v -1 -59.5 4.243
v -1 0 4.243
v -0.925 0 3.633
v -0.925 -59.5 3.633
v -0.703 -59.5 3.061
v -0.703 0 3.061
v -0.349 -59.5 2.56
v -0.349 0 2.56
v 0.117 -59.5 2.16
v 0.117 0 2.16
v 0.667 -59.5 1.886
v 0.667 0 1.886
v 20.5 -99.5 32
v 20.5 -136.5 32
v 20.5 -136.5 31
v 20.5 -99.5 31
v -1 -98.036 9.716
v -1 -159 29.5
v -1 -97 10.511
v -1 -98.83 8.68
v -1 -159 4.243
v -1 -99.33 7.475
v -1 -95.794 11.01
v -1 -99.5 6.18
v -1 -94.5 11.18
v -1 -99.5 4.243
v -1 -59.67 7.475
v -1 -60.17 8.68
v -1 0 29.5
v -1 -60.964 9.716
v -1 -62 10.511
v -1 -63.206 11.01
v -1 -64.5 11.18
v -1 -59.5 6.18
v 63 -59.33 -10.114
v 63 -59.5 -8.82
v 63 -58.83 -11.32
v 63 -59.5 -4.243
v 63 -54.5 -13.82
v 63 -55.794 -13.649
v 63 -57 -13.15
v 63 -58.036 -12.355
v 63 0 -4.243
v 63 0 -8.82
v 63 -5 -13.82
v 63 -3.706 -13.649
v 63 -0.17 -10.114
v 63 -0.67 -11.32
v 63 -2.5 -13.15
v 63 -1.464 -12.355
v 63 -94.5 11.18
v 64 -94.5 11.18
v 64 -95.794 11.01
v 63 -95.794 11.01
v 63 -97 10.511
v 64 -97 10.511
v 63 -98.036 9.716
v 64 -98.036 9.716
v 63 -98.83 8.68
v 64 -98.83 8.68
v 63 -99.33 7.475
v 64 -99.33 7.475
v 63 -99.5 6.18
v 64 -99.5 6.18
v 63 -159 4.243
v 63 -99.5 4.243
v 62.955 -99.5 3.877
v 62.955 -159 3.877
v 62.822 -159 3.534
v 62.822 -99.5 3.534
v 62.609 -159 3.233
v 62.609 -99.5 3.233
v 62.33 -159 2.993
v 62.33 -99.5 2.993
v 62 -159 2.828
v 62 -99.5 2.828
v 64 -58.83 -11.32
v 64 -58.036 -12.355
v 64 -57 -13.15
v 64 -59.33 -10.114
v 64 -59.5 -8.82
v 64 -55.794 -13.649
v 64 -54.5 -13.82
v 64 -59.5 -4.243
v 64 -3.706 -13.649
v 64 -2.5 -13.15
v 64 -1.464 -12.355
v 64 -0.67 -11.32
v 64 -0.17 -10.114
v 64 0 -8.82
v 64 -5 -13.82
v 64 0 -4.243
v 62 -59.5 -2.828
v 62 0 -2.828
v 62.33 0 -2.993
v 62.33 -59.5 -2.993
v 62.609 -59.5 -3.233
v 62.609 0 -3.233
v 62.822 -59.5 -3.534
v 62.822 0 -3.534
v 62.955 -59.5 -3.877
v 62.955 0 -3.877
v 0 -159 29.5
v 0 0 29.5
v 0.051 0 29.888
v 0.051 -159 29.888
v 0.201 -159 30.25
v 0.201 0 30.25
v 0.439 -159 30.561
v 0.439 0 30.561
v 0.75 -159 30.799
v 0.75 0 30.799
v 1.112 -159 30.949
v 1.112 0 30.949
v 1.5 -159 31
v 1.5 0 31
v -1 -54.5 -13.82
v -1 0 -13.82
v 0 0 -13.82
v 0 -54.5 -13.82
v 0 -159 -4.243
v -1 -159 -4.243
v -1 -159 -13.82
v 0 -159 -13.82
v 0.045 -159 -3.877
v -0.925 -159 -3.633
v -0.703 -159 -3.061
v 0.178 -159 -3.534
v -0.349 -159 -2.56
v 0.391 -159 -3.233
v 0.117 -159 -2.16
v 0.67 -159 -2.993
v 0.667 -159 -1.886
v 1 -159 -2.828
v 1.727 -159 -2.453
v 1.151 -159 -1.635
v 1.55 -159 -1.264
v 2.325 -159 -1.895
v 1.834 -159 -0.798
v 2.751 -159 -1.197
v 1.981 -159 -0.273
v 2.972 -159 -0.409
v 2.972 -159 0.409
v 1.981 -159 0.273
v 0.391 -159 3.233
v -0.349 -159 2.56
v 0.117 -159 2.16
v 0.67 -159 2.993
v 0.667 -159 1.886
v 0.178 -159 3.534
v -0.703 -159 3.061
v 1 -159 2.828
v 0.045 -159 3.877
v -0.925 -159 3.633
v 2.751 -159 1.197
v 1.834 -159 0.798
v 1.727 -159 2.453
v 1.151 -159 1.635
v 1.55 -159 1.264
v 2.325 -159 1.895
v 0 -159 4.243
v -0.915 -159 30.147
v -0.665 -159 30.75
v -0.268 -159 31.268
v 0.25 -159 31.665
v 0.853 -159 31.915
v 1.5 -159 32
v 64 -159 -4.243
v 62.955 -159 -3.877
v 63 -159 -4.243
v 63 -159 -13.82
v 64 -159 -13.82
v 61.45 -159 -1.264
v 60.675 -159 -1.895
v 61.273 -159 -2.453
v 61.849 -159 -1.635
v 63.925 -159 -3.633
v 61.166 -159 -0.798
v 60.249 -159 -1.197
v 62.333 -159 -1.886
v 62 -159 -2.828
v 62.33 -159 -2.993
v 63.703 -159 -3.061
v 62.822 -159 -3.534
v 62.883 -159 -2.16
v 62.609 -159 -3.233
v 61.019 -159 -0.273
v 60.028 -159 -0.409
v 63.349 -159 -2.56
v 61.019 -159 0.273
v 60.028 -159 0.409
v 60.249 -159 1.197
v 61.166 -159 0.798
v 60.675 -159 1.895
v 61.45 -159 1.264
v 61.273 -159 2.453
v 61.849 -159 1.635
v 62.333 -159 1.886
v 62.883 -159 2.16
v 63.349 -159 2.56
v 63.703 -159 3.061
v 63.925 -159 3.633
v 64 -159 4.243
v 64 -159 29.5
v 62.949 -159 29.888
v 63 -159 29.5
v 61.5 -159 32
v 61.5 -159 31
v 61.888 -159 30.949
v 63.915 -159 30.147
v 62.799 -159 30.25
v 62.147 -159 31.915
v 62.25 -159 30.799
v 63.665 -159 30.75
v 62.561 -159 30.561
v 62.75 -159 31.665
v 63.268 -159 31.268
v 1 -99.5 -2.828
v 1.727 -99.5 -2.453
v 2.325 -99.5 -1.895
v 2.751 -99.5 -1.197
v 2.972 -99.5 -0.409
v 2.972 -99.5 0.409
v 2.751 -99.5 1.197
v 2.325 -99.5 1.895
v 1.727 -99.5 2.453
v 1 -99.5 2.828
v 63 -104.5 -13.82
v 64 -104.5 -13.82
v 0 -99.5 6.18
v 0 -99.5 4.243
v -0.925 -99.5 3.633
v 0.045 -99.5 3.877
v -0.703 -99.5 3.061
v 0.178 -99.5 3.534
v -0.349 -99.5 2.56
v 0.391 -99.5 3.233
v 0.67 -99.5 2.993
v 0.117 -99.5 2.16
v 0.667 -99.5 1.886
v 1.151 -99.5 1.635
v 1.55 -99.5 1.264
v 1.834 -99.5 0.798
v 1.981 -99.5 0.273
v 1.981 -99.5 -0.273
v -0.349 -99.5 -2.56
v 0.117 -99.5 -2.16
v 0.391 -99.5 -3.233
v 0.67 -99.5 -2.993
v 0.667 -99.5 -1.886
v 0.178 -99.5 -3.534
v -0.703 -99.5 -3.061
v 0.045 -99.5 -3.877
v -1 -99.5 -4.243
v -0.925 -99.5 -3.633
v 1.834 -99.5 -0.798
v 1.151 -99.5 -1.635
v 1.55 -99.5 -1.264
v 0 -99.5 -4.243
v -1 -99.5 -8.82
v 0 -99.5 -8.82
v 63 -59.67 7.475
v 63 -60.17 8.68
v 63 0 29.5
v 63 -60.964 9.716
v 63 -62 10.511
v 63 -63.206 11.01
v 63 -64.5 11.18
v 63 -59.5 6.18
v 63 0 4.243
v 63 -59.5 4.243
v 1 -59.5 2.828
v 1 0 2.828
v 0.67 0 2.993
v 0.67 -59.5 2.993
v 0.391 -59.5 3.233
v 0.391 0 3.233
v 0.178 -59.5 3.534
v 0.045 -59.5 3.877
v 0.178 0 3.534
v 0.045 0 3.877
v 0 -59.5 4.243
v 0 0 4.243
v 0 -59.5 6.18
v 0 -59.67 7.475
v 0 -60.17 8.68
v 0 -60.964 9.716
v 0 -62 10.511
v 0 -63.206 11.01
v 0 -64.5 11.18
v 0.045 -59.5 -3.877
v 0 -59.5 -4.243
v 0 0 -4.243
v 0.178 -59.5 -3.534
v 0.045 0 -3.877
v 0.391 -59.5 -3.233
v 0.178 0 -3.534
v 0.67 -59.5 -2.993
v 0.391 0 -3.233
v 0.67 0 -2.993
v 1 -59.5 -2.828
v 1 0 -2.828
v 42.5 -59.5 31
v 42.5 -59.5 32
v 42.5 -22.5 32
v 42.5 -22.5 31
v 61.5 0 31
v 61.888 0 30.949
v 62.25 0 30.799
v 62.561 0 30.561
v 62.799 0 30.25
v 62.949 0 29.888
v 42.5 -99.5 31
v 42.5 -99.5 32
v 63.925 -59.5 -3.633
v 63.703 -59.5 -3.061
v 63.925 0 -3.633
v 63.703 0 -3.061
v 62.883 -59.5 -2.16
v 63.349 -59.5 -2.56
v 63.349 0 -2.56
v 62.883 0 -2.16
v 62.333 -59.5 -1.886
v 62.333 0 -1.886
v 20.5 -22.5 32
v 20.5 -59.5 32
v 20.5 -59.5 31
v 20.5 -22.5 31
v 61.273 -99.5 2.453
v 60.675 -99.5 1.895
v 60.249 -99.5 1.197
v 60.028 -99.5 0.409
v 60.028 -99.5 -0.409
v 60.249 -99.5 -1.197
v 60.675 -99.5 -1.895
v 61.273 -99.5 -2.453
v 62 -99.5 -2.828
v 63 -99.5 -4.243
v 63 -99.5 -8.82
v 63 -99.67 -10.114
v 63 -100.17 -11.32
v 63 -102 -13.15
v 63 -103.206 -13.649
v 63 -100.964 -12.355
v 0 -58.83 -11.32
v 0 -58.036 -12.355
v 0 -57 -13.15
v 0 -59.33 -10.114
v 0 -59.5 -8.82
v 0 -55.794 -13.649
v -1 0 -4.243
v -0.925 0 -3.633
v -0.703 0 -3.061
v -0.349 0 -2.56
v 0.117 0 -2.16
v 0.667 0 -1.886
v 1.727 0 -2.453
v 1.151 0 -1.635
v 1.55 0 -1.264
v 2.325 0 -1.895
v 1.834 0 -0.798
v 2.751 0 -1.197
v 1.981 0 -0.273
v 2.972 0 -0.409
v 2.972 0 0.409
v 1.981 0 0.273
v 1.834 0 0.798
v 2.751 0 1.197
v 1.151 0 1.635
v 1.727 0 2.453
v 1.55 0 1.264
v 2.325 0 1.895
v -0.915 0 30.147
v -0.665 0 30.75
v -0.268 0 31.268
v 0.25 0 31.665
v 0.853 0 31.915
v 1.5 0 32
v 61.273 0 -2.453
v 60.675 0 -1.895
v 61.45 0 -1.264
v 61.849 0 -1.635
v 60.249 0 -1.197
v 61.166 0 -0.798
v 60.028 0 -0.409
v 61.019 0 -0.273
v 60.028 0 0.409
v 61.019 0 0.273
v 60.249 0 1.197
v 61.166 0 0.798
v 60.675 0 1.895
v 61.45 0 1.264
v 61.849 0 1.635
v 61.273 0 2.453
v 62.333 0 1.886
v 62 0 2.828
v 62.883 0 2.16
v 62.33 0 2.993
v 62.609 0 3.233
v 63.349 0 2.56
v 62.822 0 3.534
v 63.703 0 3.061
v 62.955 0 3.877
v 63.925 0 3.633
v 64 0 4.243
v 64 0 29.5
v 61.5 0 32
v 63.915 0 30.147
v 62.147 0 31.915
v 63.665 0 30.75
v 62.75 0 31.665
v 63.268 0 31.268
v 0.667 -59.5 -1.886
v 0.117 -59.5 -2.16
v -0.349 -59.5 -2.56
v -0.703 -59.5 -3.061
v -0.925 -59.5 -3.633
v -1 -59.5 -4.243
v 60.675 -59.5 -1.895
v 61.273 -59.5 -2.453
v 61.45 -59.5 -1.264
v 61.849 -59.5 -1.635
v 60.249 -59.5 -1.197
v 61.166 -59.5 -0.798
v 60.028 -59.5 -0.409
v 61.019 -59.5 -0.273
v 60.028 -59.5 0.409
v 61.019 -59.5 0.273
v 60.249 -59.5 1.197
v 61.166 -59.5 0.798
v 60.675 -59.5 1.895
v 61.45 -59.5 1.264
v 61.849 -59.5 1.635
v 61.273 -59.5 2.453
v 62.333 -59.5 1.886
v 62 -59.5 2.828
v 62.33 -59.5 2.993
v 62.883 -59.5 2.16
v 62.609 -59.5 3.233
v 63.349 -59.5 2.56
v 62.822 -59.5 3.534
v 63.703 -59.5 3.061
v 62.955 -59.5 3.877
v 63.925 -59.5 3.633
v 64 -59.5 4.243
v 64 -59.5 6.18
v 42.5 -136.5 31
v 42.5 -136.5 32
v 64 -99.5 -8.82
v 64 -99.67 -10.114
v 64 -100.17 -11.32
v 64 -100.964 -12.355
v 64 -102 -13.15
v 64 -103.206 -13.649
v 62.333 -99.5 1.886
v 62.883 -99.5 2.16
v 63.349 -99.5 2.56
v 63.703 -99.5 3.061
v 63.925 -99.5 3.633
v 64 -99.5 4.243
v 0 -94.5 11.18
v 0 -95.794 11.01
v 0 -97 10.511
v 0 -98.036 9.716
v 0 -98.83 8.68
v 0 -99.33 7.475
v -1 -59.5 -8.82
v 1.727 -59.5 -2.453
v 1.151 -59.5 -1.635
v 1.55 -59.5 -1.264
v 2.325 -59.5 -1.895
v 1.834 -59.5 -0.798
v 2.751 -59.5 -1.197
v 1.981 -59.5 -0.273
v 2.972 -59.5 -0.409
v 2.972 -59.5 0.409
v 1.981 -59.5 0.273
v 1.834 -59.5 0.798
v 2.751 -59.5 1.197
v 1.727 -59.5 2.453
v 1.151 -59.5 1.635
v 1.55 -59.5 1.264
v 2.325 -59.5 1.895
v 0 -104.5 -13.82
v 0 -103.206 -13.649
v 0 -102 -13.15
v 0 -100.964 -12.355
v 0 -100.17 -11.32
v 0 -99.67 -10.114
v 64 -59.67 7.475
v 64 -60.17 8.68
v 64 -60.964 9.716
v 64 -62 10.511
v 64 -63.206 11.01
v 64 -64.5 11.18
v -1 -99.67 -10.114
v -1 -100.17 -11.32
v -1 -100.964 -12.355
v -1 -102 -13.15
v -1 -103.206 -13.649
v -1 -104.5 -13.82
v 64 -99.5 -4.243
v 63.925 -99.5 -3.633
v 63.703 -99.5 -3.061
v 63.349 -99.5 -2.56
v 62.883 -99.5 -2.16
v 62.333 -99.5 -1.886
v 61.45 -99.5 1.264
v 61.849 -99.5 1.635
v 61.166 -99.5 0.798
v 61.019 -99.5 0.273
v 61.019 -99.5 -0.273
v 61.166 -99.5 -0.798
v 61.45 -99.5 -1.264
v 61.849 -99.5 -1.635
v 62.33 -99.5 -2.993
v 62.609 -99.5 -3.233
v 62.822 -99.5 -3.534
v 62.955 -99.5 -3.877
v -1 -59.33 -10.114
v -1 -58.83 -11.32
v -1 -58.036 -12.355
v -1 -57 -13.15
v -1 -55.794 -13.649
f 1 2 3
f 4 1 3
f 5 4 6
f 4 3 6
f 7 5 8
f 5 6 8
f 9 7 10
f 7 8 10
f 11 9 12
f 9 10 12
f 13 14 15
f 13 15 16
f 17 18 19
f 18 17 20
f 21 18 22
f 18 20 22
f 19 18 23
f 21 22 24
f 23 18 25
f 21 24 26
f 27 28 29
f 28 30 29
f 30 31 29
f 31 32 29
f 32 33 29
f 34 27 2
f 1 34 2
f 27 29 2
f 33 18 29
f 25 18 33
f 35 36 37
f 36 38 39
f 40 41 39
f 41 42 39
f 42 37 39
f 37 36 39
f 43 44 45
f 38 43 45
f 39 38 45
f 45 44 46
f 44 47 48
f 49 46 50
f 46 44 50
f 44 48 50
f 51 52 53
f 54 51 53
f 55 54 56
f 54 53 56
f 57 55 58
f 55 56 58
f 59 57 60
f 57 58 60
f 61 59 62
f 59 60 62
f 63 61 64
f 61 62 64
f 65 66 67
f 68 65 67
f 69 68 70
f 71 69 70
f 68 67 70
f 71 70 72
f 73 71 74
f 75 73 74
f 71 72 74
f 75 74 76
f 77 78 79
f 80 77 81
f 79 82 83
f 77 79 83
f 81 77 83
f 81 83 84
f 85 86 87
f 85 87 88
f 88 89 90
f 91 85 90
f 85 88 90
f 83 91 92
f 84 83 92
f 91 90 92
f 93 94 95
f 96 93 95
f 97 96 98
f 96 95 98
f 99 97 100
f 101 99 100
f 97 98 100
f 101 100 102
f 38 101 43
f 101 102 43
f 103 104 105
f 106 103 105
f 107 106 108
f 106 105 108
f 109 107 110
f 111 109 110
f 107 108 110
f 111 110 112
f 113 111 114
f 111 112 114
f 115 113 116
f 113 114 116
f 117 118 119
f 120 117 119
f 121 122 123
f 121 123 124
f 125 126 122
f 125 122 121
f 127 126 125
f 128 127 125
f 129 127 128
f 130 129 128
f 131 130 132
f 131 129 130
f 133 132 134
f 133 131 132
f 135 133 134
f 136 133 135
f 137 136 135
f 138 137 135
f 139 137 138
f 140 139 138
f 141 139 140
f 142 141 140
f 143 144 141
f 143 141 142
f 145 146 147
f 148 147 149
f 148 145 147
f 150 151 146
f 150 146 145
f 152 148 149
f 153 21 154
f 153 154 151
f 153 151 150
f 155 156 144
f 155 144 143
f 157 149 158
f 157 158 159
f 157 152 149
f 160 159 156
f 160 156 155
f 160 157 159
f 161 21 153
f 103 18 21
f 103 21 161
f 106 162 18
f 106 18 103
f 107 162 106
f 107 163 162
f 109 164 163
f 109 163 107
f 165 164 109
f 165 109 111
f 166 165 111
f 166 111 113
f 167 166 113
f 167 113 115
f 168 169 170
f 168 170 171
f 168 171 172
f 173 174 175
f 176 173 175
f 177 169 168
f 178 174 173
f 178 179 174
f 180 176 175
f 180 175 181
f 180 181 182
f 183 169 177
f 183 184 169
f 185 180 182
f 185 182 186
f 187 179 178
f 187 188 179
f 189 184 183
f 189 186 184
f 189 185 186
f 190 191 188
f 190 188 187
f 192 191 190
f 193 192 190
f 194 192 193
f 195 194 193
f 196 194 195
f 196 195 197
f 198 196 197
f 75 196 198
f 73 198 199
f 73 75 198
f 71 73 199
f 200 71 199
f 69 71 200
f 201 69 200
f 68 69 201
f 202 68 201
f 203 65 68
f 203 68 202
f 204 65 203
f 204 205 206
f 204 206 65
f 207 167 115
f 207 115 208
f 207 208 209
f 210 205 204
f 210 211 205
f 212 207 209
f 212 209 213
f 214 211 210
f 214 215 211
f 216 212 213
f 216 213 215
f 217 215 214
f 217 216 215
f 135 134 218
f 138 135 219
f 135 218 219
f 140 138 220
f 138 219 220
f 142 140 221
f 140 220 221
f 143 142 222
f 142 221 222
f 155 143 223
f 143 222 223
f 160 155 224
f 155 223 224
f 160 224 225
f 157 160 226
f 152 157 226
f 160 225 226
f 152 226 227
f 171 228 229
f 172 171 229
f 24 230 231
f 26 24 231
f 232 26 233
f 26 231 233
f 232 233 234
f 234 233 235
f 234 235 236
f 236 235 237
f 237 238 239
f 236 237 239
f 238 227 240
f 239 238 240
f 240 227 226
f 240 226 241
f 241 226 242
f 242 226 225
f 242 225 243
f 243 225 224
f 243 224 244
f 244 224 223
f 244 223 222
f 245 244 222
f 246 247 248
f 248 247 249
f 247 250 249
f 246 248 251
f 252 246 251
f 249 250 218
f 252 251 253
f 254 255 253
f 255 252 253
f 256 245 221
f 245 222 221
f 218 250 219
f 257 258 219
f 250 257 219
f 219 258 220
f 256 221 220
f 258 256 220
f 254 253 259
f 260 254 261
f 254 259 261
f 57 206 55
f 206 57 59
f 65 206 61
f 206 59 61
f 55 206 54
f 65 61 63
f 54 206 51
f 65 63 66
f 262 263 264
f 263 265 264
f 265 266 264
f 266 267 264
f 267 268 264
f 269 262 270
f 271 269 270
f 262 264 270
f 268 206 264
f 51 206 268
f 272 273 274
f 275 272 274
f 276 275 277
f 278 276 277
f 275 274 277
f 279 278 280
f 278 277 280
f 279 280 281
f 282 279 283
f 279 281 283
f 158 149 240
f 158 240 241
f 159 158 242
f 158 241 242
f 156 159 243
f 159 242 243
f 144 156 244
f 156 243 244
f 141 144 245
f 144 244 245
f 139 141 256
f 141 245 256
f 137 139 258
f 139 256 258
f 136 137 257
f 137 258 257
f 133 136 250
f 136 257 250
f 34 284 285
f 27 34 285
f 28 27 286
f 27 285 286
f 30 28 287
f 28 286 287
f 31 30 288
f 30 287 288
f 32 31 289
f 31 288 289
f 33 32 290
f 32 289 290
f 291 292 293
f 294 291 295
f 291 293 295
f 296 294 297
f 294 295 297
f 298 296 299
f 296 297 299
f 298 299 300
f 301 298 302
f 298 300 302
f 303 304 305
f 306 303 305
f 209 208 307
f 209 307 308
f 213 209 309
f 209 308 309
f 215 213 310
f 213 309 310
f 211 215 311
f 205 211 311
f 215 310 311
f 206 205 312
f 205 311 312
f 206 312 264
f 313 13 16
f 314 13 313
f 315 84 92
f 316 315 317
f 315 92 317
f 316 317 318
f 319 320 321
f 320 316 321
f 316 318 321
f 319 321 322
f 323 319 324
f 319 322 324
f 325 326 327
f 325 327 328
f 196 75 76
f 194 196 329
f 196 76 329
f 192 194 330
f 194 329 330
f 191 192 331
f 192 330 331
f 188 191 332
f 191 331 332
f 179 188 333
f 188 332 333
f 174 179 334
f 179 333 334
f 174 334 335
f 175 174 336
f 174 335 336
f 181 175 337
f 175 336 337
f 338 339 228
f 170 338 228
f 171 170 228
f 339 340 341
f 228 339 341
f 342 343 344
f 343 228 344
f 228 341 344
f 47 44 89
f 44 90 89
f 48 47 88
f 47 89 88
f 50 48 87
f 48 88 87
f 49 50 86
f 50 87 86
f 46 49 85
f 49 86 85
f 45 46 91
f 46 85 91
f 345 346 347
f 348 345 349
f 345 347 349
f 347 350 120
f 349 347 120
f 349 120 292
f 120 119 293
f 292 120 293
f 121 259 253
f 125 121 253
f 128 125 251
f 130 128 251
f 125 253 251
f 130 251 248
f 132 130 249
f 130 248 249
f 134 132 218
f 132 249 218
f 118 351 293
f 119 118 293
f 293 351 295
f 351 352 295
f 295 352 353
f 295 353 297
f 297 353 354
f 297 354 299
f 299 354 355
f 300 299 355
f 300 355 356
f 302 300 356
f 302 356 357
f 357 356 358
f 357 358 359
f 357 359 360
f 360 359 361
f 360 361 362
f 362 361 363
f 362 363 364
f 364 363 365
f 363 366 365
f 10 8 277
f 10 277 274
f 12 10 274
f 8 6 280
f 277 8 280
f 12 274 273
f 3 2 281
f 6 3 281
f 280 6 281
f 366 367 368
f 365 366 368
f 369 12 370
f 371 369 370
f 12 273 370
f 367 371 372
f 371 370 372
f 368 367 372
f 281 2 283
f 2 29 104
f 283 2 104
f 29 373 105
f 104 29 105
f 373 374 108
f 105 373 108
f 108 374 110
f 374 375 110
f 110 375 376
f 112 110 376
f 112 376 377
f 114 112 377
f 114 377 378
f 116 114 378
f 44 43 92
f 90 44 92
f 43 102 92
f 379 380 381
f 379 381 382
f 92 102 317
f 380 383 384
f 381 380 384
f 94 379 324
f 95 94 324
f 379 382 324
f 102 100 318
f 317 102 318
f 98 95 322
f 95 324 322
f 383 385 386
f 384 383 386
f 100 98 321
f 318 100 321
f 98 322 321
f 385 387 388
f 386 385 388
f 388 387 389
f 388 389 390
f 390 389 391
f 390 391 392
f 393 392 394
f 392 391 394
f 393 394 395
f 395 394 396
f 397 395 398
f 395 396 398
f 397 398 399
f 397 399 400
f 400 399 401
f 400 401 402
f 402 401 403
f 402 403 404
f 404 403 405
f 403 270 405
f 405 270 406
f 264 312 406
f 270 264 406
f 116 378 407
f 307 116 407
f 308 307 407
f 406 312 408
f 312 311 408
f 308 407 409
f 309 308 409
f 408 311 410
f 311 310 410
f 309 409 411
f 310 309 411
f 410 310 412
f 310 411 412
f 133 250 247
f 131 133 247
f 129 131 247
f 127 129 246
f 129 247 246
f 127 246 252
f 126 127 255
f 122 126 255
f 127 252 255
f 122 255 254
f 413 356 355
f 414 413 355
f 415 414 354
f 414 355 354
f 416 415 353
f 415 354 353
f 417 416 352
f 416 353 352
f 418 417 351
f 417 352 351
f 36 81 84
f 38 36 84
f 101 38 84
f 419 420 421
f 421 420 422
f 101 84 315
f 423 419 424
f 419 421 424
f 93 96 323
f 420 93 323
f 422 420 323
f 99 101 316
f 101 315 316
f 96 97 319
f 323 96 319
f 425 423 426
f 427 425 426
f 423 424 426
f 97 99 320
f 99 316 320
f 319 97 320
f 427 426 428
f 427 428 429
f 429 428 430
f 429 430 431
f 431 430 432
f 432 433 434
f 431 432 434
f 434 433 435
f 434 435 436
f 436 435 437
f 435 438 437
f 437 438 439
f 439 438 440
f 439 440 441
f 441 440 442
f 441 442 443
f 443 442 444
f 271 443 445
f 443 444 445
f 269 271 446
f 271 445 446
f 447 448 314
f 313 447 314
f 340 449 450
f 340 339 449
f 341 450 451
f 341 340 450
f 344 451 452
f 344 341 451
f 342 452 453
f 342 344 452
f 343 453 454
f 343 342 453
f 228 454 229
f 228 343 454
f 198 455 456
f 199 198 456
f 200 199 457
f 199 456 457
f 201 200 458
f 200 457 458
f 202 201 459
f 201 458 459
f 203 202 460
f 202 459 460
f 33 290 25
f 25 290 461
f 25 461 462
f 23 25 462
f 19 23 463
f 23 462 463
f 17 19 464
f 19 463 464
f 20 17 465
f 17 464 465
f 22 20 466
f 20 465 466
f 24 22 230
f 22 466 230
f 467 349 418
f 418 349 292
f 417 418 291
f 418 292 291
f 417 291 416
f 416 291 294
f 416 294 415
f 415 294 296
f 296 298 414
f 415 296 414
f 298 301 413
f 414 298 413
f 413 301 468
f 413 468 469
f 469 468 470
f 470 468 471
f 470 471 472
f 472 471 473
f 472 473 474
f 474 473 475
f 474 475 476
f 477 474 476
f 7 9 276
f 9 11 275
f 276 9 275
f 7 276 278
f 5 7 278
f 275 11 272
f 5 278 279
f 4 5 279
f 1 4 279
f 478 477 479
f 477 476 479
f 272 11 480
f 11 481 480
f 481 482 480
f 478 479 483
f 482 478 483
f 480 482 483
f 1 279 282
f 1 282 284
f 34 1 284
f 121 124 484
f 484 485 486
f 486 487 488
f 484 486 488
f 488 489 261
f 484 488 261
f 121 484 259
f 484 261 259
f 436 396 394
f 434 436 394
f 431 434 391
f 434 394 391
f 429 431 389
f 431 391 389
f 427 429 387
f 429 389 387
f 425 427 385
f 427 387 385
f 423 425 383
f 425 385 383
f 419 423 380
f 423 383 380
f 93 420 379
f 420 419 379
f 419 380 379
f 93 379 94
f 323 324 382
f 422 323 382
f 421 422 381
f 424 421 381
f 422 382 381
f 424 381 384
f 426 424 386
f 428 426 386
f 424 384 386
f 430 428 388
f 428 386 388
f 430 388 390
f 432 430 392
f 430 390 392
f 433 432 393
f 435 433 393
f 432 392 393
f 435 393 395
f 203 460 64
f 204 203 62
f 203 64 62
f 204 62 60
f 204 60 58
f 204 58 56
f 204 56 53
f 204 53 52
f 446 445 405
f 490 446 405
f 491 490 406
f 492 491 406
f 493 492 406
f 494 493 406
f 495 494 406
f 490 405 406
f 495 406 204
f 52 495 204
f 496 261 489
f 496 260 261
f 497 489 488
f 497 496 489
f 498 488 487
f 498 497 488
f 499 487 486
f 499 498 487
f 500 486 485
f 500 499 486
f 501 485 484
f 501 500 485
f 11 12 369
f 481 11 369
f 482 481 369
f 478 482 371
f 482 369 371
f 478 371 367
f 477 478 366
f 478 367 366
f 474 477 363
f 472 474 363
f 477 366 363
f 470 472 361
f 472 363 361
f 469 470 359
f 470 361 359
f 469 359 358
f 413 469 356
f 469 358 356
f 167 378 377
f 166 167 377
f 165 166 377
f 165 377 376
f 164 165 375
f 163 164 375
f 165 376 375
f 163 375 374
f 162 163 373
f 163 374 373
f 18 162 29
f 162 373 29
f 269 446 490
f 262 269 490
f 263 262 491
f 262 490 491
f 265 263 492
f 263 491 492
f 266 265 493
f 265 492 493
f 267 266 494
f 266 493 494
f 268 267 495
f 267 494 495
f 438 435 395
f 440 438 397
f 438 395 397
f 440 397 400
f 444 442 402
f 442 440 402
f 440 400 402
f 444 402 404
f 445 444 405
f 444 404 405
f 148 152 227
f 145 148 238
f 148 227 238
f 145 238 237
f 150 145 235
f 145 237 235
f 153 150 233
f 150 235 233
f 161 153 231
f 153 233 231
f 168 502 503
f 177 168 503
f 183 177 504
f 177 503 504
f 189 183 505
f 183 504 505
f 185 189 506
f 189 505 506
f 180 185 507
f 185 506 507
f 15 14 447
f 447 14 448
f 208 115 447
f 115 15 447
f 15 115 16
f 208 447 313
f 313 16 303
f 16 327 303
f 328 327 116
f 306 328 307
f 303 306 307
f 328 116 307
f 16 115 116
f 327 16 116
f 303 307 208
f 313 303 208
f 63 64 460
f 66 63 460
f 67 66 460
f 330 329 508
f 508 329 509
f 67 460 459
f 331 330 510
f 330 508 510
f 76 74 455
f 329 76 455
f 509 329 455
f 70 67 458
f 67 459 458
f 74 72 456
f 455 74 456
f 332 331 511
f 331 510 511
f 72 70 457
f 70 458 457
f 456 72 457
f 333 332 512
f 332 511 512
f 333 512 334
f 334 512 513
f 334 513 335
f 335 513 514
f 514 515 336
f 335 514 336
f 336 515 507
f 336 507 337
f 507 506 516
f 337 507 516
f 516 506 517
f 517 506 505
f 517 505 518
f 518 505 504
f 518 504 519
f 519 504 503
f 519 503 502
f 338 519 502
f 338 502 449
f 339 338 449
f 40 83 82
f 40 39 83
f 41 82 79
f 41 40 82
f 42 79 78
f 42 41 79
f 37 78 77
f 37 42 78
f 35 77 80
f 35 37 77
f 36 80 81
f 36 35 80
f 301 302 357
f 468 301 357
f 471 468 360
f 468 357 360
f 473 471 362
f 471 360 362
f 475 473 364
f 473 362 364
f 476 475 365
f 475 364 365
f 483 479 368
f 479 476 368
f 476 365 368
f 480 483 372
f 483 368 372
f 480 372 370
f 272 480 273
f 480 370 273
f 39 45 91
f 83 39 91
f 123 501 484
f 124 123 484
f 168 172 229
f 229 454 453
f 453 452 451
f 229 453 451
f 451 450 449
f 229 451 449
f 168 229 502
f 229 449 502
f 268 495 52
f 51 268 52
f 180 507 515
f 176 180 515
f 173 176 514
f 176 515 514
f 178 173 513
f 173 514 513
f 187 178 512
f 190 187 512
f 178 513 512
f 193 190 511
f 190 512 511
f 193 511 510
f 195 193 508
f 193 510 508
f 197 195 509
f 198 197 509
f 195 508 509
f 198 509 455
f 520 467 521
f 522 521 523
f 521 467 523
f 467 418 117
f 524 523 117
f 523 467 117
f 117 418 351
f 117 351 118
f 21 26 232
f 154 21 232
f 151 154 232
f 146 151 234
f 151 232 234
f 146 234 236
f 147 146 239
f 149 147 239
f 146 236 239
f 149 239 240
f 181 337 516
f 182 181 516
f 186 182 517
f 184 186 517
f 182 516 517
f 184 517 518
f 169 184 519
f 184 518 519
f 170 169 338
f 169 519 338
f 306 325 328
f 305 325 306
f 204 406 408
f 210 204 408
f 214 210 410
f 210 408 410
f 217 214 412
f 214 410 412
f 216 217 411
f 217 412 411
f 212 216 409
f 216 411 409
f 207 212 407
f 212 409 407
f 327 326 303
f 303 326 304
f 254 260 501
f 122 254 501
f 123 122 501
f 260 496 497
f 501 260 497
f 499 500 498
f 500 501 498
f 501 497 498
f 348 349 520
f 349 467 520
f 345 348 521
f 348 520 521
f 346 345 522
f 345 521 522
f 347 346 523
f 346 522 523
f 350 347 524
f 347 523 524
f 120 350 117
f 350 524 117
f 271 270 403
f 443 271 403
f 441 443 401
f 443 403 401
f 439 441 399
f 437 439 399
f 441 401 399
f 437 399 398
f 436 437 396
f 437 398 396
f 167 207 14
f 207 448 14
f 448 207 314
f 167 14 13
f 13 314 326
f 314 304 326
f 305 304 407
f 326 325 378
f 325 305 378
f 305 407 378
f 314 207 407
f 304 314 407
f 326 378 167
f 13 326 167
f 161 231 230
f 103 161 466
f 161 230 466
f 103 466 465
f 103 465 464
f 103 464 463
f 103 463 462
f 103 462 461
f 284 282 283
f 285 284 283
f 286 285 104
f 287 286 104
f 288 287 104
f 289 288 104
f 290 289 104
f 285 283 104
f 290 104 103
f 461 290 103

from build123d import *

# Parameters (mm, degrees)
F1_DEPTH = 159
F2_W     = 22
F2_H     = 37
F3_DEPTH = 45.8205918838
F4_W     = 40
F4_H     = 9.5769511967
F5_DEPTH = 65.001
F6_R     = 5


with BuildPart() as f1:
    # F0 (on Front) → F1 (new body)
    with BuildSketch(Plane.XZ):
        with BuildLine():
            ThreePointArc((0.6666666667, 1.8856180832), (2, 0), (0.6666666667, -1.8856180832))
            ThreePointArc((0.6666666667, -1.8856180832), (-0.5412414523, -2.7992650141), (-1, -4.2426406871))
            Line((-1, -4.2426406871), (-1, -13.8195918838))
            Line((-1, -13.8195918838), (0, -13.8195918838))
            Line((0, -13.8195918838), (0, -4.2426406871))
            ThreePointArc((0, -4.2426406871), (0.2752551286, -3.3766152833), (1, -2.8284271247))
            ThreePointArc((1, -2.8284271247), (3, 0), (1, 2.8284271247))
            ThreePointArc((1, 2.8284271247), (0.2752551286, 3.3766152833), (0, 4.2426406871))
            Line((0, 4.2426406871), (0, 29.5))
            ThreePointArc((0, 29.5), (0.4393398282, 30.5606601718), (1.5, 31))
            Line((1.5, 31), (61.5, 31))
            ThreePointArc((61.5, 31), (62.5606601718, 30.5606601718), (63, 29.5))
            Line((63, 29.5), (63, 4.2426406871))
            ThreePointArc((63, 4.2426406871), (62.7247448714, 3.3766152833), (62, 2.8284271247))
            ThreePointArc((62, 2.8284271247), (60, 0), (62, -2.8284271247))
            ThreePointArc((62, -2.8284271247), (62.7247448714, -3.3766152833), (63, -4.2426406871))
            Line((63, -4.2426406871), (63, -13.8195918838))
            Line((63, -13.8195918838), (64, -13.8195918838))
            Line((64, -13.8195918838), (64, -4.2426406871))
            ThreePointArc((64, -4.2426406871), (63.5412414523, -2.7992650141), (62.3333333333, -1.8856180832))
            ThreePointArc((62.3333333333, -1.8856180832), (61, 0), (62.3333333333, 1.8856180832))
            ThreePointArc((62.3333333333, 1.8856180832), (63.5412414523, 2.7992650141), (64, 4.2426406871))
            Line((64, 4.2426406871), (64, 29.5))
            ThreePointArc((64, 29.5), (63.267766953, 31.267766953), (61.5, 32))
            Line((61.5, 32), (1.5, 32))
            ThreePointArc((1.5, 32), (-0.267766953, 31.267766953), (-1, 29.5))
            Line((-1, 29.5), (-1, 4.2426406871))
            ThreePointArc((-1, 4.2426406871), (-0.5412414523, 2.7992650141), (0.6666666667, 1.8856180832))
        make_face()
    extrude(amount=F1_DEPTH)

    # F2 (on face) → F3 (cut, through all)
    with BuildSketch(Plane.XY.offset(32)):
        with Locations((31.5, -118)):
            Rectangle(F2_W, F2_H)
        with Locations((31.5, -41)):
            Rectangle(F2_W, F2_H)
    extrude(amount=-F3_DEPTH, mode=Mode.SUBTRACT)

    # F4 (on face) → F5 (cut, through all)
    with BuildSketch(Plane.YZ.offset(64)):
        with BuildLine():
            Line((-99.5, -4.2426406871), (-59.5, -4.2426406871))
            Line((-59.5, -4.2426406871), (-59.5, 6.1804081162))
            ThreePointArc((-59.5, 6.1804081162), (-60.9644660941, 9.7159420222), (-64.5, 11.1804081162))
            Line((-64.5, 11.1804081162), (-94.5, 11.1804081162))
            ThreePointArc((-94.5, 11.1804081162), (-98.0355339059, 9.7159420222), (-99.5, 6.1804081162))
            Line((-99.5, 6.1804081162), (-99.5, -4.2426406871))
        make_face()
        with Locations((-79.5, -9.0311162854)):
            Rectangle(F4_W, F4_H)
    extrude(amount=-F5_DEPTH, mode=Mode.SUBTRACT)

    # F6
    f6_edges = [f1.edges().sort_by_distance(p)[0] for p in [
        (63.5, 0, -13.819592),
        (63.5, -99.5, -13.819592),
        (63.5, -59.5, -13.819592),
        (-0.5, -99.5, -13.819592),
        (-0.5, -59.5, -13.819592),
    ]]
    fillet(f6_edges, radius=F6_R)


solid = f1.part
